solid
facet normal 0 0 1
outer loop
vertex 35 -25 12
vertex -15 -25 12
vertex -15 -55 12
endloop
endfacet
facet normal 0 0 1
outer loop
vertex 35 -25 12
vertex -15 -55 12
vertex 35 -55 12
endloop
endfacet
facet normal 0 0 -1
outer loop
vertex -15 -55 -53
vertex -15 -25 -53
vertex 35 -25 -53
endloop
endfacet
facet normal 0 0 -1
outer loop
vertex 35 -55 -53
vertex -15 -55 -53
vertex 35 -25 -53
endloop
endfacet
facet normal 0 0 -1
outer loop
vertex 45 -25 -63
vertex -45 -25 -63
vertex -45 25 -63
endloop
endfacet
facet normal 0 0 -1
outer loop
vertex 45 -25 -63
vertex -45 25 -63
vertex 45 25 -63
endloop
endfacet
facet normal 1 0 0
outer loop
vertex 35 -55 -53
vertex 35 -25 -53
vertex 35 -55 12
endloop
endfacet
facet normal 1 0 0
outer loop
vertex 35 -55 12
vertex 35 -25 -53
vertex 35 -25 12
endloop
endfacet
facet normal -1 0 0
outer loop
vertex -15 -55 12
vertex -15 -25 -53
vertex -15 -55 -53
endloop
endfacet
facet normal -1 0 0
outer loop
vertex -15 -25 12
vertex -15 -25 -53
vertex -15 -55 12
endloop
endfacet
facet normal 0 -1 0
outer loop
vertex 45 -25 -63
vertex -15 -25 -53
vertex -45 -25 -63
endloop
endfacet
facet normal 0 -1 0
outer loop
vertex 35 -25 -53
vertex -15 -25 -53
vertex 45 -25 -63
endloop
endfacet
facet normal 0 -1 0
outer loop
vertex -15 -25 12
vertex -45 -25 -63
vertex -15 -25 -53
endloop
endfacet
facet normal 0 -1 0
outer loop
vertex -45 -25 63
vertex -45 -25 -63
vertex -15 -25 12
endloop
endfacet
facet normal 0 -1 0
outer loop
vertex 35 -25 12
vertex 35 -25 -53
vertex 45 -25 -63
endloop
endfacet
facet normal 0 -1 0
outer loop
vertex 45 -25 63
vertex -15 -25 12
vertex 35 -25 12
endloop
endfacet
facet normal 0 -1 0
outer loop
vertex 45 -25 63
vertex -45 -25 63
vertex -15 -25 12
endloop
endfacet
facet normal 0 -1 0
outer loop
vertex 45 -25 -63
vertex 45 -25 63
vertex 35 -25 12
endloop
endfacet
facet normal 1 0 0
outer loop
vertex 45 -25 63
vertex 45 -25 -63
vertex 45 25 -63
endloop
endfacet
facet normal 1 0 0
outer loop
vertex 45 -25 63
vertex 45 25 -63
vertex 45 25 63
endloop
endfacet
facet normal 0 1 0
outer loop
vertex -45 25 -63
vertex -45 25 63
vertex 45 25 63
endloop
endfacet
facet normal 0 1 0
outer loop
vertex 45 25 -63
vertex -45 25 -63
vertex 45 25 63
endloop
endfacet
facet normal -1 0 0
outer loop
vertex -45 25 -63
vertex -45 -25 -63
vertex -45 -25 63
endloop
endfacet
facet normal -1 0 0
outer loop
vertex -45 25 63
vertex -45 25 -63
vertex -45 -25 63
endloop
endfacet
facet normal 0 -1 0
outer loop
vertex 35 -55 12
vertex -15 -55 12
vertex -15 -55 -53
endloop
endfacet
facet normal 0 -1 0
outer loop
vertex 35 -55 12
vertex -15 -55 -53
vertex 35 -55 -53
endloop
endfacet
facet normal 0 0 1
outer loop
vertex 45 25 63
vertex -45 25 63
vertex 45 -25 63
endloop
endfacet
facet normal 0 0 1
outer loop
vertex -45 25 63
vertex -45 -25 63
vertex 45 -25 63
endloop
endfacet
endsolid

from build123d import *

# Parameters (mm, degrees)
F0_W     = 90
F0_H     = 126
F1_DEPTH = 25
F2_W     = 50
F2_H     = 65
F3_DEPTH = 30


with BuildPart() as f1:
    # F0 (on Front) → F1 (new body, symmetric)
    with BuildSketch(Plane.XZ):
        Rectangle(F0_W, F0_H)
    extrude(amount=F1_DEPTH, both=True)

    # F2 (on face) → F3 (join)
    with BuildSketch(Plane.XZ.offset(25)):
        with Locations((10, -20.5)):
            Rectangle(F2_W, F2_H)
    extrude(amount=F3_DEPTH)


solid = f1.part
